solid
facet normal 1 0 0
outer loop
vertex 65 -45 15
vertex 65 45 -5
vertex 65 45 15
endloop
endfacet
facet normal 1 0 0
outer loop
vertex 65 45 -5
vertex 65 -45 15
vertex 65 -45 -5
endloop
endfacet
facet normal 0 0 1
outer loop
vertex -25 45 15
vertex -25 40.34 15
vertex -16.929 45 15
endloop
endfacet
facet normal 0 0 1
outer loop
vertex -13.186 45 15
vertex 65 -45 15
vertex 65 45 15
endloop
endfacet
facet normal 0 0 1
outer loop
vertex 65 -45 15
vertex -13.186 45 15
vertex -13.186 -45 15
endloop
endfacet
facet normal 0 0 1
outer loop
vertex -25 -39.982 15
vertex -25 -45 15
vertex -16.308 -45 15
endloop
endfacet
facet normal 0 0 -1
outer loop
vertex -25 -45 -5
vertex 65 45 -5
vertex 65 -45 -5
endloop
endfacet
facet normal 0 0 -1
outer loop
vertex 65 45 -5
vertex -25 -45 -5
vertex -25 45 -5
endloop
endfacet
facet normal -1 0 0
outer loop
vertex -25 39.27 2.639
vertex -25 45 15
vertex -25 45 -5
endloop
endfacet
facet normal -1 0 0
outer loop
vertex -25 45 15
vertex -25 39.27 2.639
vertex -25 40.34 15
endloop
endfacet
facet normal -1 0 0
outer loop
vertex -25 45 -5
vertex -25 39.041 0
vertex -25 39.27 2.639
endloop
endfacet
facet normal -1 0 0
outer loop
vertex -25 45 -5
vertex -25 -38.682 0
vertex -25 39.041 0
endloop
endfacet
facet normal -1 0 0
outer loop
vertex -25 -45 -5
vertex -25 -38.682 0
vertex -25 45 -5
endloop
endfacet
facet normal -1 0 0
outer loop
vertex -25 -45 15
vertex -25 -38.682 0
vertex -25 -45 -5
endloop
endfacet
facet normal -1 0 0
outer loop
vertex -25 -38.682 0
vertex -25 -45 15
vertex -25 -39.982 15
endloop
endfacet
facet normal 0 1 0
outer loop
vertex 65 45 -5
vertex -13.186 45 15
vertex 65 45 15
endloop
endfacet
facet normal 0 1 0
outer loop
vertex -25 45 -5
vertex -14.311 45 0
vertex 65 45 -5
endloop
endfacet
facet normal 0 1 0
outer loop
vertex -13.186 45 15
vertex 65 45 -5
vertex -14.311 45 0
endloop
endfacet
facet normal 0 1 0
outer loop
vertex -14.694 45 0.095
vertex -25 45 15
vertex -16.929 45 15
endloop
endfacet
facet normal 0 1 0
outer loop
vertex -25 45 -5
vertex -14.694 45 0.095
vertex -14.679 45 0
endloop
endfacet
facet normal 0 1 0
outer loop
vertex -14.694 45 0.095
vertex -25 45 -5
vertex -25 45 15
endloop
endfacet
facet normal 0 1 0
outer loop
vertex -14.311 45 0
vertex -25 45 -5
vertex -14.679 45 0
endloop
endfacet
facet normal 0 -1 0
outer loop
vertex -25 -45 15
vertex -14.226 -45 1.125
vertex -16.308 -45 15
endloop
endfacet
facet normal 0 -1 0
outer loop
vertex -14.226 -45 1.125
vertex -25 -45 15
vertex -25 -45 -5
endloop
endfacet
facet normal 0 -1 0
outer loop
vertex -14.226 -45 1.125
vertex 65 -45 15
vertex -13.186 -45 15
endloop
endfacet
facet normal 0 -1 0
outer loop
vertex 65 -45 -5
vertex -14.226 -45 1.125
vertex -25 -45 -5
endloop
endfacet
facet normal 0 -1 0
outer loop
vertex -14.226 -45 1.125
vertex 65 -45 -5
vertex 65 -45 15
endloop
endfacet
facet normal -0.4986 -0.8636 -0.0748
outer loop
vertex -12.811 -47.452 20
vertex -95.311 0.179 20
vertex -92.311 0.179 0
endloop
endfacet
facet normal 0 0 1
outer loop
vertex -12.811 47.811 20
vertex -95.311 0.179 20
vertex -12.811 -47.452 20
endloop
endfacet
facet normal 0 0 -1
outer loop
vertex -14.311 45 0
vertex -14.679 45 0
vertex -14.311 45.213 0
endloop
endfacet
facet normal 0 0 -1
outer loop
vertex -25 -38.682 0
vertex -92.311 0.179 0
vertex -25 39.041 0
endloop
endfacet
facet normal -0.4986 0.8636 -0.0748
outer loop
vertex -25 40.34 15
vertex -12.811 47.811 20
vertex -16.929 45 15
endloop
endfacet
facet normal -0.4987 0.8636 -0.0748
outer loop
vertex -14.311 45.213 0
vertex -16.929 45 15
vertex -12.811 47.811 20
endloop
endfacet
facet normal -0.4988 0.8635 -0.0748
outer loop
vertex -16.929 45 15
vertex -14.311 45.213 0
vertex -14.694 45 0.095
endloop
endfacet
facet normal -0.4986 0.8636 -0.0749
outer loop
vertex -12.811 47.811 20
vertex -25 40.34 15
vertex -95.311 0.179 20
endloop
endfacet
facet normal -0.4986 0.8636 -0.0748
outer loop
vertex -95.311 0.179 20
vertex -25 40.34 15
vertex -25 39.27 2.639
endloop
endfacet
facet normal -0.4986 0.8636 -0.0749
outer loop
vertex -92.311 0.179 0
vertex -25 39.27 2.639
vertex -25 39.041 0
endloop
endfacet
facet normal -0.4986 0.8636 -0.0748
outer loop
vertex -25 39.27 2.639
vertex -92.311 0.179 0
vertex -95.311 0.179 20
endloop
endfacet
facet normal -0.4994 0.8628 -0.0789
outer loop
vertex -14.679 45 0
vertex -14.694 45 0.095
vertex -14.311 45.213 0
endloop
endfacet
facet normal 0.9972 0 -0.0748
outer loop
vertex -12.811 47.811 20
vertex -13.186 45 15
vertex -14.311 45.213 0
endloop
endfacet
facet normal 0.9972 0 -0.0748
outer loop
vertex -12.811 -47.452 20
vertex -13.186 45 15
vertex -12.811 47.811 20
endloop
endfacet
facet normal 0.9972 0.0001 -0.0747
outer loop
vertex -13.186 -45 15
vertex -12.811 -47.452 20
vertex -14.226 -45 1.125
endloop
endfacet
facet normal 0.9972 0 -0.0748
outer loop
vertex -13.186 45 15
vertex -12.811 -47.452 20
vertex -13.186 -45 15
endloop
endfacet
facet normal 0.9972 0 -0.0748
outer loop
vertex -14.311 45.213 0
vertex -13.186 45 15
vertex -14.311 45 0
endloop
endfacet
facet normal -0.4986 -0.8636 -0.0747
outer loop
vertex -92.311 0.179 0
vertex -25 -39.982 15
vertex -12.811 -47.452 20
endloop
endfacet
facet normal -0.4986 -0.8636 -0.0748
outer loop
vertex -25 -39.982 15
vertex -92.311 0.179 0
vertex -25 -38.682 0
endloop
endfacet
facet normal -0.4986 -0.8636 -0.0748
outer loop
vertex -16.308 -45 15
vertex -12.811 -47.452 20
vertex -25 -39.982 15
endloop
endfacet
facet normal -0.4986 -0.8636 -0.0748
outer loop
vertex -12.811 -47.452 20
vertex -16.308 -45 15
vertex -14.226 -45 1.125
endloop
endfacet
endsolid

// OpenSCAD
difference()
{
%cube([140,100,20],center = true);
translate([-25,-45,-5])    
cube([90,90,20]);
}

rotate(60,[0,0,1])
translate([-20,35,0])
cylinder(20,52,55, $fn=3);
    
